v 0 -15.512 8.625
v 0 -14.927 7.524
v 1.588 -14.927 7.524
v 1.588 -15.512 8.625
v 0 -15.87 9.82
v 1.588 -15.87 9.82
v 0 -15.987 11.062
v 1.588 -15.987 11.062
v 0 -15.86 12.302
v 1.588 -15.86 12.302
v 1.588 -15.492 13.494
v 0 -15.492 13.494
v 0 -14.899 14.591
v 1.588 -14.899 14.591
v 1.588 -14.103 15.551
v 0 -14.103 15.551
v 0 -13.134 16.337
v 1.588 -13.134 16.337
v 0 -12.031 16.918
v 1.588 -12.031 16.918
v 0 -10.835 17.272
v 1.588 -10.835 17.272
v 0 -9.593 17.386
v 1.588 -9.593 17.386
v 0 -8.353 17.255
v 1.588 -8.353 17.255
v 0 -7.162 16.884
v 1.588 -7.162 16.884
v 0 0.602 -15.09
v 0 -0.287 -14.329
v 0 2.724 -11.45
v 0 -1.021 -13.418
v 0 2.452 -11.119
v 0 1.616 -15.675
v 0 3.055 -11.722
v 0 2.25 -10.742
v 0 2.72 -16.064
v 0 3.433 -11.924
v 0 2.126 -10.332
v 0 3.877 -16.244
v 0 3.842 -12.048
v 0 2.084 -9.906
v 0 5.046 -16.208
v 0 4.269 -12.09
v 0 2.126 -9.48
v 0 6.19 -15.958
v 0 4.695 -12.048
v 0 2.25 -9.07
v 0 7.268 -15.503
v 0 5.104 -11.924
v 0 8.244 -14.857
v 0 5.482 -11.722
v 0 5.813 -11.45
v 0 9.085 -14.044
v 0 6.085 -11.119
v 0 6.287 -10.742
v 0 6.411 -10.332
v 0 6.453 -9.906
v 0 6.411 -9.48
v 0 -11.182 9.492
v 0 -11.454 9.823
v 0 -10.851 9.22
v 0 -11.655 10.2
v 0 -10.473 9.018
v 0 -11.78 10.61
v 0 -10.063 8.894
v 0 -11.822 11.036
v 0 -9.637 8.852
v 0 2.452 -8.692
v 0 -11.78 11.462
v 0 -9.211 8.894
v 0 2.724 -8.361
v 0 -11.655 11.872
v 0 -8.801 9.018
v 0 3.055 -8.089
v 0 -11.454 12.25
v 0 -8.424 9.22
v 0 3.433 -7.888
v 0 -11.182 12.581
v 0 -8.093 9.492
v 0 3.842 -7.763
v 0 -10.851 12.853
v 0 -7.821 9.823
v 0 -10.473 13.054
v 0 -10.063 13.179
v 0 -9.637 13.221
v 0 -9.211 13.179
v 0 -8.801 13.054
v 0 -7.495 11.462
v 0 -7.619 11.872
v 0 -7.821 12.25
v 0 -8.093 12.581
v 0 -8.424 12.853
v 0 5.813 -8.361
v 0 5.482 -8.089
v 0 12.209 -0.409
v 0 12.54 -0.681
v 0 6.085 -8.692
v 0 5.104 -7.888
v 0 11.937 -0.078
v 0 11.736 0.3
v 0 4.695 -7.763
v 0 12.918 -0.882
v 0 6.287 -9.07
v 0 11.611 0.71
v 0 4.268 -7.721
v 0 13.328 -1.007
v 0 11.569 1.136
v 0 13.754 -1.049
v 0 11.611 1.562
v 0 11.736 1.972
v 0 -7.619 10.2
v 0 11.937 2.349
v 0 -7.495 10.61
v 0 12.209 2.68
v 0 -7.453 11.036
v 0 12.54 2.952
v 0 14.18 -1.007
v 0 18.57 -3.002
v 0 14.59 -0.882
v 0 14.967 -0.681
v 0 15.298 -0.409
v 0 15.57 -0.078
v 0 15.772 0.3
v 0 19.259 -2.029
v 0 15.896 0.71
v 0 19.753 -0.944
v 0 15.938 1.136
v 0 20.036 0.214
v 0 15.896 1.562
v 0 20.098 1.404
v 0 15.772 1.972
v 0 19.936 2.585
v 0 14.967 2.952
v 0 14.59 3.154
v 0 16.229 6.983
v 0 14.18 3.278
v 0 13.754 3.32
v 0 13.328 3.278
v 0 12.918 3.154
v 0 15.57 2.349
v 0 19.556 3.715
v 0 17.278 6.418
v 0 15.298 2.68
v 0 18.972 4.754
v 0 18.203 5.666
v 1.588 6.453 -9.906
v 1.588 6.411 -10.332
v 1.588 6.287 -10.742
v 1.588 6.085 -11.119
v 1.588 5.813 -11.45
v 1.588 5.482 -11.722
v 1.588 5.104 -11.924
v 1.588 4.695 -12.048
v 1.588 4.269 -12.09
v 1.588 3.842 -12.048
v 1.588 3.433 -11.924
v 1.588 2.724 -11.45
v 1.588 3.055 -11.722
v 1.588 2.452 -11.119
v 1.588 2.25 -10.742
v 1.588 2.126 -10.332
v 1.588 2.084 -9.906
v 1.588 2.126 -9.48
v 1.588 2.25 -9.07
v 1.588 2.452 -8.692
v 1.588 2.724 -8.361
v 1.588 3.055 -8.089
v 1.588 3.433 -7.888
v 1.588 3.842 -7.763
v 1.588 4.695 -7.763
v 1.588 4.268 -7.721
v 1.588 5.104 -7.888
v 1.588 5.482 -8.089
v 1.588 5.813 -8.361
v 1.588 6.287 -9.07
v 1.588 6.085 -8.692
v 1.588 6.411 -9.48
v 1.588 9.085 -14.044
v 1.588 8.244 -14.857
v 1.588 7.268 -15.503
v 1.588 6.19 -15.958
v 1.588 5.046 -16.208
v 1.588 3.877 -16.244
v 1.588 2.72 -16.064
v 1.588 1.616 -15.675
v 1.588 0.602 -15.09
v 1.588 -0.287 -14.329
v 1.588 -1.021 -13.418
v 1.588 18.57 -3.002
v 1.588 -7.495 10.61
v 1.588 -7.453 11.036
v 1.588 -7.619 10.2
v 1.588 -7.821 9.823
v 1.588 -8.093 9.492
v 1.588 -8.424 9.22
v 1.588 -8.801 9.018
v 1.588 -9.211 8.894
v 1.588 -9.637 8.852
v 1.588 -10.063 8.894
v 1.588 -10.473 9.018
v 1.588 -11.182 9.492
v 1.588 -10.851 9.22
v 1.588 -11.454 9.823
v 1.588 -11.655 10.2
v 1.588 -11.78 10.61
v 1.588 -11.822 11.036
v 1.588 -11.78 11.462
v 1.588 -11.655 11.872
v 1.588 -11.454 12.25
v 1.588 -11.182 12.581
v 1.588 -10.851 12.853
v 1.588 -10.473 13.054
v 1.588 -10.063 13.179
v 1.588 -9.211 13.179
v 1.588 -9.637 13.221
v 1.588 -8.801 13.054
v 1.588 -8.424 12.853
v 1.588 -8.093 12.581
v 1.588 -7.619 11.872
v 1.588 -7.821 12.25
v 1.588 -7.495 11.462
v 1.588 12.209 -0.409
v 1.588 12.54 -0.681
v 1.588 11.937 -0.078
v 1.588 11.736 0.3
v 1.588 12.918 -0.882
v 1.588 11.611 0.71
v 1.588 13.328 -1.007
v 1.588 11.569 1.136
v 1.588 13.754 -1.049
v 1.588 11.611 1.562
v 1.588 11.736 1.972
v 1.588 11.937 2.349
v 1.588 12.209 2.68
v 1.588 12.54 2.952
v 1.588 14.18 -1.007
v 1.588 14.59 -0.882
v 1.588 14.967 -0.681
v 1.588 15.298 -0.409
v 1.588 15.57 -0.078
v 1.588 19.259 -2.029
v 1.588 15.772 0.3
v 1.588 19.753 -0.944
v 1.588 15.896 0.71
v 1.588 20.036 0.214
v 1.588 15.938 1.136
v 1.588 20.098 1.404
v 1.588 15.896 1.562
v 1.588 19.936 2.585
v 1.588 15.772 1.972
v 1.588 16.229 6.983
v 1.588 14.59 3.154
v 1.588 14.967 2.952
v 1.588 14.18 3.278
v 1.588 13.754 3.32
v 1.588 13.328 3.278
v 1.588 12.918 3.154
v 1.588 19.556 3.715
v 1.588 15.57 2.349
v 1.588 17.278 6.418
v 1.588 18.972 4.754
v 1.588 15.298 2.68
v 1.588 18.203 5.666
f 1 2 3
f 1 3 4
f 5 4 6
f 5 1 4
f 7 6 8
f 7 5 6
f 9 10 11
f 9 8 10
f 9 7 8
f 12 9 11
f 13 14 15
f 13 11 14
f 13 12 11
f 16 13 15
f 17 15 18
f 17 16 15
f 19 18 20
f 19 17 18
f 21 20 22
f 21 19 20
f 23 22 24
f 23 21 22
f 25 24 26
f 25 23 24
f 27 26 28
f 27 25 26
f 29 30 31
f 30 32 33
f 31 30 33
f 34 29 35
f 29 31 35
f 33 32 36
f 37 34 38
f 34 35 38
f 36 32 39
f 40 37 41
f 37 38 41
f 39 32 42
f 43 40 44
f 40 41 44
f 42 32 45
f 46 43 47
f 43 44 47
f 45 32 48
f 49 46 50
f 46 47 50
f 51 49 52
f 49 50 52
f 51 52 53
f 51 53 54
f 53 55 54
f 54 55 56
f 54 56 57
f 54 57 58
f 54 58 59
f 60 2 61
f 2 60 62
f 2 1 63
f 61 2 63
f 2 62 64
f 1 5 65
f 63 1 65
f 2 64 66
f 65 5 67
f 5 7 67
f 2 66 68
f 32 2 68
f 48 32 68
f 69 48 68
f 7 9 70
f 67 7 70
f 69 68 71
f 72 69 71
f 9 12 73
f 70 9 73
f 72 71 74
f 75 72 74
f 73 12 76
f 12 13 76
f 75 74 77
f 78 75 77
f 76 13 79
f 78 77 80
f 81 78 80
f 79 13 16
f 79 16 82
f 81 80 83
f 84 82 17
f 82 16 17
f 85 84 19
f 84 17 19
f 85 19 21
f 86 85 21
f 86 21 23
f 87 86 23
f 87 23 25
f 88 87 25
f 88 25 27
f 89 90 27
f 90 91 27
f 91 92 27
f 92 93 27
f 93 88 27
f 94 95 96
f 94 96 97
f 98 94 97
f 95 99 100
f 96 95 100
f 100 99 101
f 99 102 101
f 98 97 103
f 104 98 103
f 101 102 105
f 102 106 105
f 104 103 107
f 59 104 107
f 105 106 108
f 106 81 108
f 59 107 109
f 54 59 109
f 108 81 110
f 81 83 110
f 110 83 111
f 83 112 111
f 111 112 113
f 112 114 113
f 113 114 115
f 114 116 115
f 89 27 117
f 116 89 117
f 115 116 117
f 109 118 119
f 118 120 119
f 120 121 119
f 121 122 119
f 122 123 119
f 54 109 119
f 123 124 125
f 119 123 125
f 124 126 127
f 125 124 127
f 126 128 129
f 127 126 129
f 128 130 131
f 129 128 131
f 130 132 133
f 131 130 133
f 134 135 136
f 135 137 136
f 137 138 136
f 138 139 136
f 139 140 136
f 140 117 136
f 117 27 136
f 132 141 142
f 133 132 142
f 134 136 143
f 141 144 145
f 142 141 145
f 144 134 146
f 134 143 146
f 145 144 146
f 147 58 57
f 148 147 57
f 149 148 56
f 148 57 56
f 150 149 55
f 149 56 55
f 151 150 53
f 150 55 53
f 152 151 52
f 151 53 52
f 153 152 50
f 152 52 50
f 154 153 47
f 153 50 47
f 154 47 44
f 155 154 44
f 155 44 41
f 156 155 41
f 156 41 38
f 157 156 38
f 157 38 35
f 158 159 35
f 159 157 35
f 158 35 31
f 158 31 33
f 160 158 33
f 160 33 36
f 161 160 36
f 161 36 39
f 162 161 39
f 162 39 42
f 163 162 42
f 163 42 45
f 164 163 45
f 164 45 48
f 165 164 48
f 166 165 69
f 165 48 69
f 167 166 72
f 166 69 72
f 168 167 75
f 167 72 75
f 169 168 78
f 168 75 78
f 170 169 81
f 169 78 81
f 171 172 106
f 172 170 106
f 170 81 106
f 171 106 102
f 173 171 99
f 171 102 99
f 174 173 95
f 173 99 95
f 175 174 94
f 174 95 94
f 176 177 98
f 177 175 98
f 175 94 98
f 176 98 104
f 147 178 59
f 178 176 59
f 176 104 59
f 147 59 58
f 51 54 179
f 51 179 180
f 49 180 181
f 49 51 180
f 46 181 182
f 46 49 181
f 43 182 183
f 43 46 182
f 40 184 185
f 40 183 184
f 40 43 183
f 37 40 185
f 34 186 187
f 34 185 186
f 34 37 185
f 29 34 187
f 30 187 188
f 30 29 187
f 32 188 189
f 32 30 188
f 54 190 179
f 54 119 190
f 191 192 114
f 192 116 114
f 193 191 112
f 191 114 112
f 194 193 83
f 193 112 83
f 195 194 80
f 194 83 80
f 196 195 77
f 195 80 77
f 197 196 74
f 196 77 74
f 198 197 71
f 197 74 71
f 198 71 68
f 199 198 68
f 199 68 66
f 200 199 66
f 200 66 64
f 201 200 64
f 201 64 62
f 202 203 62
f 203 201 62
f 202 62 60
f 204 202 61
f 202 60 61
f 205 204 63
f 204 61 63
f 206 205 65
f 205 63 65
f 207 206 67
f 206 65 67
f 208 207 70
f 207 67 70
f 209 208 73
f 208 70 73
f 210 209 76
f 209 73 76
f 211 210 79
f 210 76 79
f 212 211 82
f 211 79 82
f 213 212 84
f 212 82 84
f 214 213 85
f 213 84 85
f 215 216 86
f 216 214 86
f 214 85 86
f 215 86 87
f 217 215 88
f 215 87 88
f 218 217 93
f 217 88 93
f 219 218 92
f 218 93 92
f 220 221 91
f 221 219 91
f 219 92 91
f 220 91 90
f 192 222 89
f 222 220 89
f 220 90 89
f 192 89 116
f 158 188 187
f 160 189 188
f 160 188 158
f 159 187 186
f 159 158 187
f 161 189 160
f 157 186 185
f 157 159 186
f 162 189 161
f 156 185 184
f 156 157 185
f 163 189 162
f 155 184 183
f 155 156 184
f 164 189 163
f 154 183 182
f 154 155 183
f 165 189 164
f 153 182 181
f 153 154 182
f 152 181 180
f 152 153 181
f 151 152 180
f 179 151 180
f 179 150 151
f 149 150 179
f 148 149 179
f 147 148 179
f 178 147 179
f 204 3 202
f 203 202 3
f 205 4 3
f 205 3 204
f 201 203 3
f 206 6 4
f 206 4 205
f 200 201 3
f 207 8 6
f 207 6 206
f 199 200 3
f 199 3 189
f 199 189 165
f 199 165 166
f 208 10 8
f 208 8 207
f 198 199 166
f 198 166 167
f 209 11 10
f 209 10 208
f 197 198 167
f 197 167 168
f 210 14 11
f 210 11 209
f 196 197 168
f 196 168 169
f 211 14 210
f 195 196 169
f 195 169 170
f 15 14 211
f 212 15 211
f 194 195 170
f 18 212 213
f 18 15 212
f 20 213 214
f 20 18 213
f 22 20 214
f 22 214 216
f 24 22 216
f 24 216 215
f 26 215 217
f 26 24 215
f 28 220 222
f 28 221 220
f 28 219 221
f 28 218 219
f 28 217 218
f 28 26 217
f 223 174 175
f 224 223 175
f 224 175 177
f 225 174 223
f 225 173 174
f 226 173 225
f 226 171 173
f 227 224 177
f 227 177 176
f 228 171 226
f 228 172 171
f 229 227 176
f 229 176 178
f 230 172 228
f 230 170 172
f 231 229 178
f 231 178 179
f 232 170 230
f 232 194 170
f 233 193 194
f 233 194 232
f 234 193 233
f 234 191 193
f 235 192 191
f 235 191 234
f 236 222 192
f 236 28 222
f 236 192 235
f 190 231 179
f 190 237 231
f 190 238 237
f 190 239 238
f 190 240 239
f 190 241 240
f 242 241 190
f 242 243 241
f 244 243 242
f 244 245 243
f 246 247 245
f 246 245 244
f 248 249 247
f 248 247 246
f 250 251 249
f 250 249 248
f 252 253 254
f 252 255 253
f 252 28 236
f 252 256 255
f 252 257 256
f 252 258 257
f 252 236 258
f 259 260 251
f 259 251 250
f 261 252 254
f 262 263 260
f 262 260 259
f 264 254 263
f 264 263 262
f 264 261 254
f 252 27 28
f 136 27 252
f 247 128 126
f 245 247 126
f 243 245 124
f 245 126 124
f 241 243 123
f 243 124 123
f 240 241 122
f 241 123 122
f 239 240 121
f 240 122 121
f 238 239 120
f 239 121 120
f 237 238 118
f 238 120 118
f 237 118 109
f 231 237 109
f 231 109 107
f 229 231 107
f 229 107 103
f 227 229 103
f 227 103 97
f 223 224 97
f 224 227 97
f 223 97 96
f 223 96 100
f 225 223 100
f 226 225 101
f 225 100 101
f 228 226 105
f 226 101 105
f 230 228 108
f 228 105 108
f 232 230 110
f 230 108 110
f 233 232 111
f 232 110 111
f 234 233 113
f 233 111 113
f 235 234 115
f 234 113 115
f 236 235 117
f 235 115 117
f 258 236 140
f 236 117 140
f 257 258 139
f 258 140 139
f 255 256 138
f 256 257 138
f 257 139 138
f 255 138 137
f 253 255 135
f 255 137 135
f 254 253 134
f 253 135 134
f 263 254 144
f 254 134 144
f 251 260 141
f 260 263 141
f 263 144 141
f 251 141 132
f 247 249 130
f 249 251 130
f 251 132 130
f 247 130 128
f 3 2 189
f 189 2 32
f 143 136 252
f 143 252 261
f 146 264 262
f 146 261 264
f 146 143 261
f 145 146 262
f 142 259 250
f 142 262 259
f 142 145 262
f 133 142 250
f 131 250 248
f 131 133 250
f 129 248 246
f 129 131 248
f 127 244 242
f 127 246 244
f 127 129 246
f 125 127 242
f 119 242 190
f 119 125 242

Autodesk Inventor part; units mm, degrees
ref_plane "YZ Plane" through (0, 0, 0) normal (1, 0, 0) x (0, 1, 0)
ref_plane "XZ Plane" through (0, 0, 0) normal (0, 1, 0) x (-1, 0, 0)
ref_plane "XY Plane" through (0, 0, 0) normal (0, 0, 1) x (1, 0, 0)
sketch "Sketch1" plane through (0, 0, 0) normal (1, 0, 0) x (0, 1, 0)
  circle A0 centre (4.2685, -9.9057) radius 2.1844
  circle A1 centre (13.7537, 1.1357) radius 2.1844
  circle A2 centre (-9.6373, 11.0363) radius 2.1844
  arc A3 (18.5704, -3.0021) -> (16.2288, 6.9834) centre (13.7537, 1.1357) ccw
  arc A4 (-1.0214, -13.4183) -> (9.0853, -14.0435) centre (4.2685, -9.9057) ccw
  arc A5 (-7.1621, 16.884) -> (-14.9273, 7.5236) centre (-9.6373, 11.0363) ccw
  line L0 (-7.1621, 16.884) -> (16.2288, 6.9834)
  line L1 (-14.9273, 7.5236) -> (-1.0214, -13.4183)
  line L2 (18.5704, -3.0021) -> (9.0853, -14.0435)
  point P0 (0, 0)
  dimension "d0" = 12.7
  dimension "d1" = 12.7
  dimension "d2" = 12.7
extrude "Extrusion1" add sketch "Sketch1" along normal blind 1.5875
properties part number "Conveyer Gusset" material "Acetal Resin, White"
